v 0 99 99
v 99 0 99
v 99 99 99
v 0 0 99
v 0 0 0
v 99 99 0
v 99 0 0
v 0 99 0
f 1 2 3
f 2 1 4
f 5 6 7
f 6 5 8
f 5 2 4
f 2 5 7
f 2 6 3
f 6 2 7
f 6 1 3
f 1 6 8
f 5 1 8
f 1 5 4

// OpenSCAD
// Used by eval-include-main.scad: only the definitions are imported. The echo and the geometry below are
// never run, and lib_value is reachable only through the library's own functions.

echo("shapes top level is not run by use");
cube(99);

lib_value = 42;
function lib_value_plus(k) = lib_value + k;
function peg_count(n) = n * 2;

module peg(h) {
    cylinder(h = h, r = 1);
}

module peg_ring(n) {
    for (i = [0 : n - 1])
        rotate([0, 0, i * 360 / n])
            translate([5, 0, 0])
                peg(h = 2 + i);
}
